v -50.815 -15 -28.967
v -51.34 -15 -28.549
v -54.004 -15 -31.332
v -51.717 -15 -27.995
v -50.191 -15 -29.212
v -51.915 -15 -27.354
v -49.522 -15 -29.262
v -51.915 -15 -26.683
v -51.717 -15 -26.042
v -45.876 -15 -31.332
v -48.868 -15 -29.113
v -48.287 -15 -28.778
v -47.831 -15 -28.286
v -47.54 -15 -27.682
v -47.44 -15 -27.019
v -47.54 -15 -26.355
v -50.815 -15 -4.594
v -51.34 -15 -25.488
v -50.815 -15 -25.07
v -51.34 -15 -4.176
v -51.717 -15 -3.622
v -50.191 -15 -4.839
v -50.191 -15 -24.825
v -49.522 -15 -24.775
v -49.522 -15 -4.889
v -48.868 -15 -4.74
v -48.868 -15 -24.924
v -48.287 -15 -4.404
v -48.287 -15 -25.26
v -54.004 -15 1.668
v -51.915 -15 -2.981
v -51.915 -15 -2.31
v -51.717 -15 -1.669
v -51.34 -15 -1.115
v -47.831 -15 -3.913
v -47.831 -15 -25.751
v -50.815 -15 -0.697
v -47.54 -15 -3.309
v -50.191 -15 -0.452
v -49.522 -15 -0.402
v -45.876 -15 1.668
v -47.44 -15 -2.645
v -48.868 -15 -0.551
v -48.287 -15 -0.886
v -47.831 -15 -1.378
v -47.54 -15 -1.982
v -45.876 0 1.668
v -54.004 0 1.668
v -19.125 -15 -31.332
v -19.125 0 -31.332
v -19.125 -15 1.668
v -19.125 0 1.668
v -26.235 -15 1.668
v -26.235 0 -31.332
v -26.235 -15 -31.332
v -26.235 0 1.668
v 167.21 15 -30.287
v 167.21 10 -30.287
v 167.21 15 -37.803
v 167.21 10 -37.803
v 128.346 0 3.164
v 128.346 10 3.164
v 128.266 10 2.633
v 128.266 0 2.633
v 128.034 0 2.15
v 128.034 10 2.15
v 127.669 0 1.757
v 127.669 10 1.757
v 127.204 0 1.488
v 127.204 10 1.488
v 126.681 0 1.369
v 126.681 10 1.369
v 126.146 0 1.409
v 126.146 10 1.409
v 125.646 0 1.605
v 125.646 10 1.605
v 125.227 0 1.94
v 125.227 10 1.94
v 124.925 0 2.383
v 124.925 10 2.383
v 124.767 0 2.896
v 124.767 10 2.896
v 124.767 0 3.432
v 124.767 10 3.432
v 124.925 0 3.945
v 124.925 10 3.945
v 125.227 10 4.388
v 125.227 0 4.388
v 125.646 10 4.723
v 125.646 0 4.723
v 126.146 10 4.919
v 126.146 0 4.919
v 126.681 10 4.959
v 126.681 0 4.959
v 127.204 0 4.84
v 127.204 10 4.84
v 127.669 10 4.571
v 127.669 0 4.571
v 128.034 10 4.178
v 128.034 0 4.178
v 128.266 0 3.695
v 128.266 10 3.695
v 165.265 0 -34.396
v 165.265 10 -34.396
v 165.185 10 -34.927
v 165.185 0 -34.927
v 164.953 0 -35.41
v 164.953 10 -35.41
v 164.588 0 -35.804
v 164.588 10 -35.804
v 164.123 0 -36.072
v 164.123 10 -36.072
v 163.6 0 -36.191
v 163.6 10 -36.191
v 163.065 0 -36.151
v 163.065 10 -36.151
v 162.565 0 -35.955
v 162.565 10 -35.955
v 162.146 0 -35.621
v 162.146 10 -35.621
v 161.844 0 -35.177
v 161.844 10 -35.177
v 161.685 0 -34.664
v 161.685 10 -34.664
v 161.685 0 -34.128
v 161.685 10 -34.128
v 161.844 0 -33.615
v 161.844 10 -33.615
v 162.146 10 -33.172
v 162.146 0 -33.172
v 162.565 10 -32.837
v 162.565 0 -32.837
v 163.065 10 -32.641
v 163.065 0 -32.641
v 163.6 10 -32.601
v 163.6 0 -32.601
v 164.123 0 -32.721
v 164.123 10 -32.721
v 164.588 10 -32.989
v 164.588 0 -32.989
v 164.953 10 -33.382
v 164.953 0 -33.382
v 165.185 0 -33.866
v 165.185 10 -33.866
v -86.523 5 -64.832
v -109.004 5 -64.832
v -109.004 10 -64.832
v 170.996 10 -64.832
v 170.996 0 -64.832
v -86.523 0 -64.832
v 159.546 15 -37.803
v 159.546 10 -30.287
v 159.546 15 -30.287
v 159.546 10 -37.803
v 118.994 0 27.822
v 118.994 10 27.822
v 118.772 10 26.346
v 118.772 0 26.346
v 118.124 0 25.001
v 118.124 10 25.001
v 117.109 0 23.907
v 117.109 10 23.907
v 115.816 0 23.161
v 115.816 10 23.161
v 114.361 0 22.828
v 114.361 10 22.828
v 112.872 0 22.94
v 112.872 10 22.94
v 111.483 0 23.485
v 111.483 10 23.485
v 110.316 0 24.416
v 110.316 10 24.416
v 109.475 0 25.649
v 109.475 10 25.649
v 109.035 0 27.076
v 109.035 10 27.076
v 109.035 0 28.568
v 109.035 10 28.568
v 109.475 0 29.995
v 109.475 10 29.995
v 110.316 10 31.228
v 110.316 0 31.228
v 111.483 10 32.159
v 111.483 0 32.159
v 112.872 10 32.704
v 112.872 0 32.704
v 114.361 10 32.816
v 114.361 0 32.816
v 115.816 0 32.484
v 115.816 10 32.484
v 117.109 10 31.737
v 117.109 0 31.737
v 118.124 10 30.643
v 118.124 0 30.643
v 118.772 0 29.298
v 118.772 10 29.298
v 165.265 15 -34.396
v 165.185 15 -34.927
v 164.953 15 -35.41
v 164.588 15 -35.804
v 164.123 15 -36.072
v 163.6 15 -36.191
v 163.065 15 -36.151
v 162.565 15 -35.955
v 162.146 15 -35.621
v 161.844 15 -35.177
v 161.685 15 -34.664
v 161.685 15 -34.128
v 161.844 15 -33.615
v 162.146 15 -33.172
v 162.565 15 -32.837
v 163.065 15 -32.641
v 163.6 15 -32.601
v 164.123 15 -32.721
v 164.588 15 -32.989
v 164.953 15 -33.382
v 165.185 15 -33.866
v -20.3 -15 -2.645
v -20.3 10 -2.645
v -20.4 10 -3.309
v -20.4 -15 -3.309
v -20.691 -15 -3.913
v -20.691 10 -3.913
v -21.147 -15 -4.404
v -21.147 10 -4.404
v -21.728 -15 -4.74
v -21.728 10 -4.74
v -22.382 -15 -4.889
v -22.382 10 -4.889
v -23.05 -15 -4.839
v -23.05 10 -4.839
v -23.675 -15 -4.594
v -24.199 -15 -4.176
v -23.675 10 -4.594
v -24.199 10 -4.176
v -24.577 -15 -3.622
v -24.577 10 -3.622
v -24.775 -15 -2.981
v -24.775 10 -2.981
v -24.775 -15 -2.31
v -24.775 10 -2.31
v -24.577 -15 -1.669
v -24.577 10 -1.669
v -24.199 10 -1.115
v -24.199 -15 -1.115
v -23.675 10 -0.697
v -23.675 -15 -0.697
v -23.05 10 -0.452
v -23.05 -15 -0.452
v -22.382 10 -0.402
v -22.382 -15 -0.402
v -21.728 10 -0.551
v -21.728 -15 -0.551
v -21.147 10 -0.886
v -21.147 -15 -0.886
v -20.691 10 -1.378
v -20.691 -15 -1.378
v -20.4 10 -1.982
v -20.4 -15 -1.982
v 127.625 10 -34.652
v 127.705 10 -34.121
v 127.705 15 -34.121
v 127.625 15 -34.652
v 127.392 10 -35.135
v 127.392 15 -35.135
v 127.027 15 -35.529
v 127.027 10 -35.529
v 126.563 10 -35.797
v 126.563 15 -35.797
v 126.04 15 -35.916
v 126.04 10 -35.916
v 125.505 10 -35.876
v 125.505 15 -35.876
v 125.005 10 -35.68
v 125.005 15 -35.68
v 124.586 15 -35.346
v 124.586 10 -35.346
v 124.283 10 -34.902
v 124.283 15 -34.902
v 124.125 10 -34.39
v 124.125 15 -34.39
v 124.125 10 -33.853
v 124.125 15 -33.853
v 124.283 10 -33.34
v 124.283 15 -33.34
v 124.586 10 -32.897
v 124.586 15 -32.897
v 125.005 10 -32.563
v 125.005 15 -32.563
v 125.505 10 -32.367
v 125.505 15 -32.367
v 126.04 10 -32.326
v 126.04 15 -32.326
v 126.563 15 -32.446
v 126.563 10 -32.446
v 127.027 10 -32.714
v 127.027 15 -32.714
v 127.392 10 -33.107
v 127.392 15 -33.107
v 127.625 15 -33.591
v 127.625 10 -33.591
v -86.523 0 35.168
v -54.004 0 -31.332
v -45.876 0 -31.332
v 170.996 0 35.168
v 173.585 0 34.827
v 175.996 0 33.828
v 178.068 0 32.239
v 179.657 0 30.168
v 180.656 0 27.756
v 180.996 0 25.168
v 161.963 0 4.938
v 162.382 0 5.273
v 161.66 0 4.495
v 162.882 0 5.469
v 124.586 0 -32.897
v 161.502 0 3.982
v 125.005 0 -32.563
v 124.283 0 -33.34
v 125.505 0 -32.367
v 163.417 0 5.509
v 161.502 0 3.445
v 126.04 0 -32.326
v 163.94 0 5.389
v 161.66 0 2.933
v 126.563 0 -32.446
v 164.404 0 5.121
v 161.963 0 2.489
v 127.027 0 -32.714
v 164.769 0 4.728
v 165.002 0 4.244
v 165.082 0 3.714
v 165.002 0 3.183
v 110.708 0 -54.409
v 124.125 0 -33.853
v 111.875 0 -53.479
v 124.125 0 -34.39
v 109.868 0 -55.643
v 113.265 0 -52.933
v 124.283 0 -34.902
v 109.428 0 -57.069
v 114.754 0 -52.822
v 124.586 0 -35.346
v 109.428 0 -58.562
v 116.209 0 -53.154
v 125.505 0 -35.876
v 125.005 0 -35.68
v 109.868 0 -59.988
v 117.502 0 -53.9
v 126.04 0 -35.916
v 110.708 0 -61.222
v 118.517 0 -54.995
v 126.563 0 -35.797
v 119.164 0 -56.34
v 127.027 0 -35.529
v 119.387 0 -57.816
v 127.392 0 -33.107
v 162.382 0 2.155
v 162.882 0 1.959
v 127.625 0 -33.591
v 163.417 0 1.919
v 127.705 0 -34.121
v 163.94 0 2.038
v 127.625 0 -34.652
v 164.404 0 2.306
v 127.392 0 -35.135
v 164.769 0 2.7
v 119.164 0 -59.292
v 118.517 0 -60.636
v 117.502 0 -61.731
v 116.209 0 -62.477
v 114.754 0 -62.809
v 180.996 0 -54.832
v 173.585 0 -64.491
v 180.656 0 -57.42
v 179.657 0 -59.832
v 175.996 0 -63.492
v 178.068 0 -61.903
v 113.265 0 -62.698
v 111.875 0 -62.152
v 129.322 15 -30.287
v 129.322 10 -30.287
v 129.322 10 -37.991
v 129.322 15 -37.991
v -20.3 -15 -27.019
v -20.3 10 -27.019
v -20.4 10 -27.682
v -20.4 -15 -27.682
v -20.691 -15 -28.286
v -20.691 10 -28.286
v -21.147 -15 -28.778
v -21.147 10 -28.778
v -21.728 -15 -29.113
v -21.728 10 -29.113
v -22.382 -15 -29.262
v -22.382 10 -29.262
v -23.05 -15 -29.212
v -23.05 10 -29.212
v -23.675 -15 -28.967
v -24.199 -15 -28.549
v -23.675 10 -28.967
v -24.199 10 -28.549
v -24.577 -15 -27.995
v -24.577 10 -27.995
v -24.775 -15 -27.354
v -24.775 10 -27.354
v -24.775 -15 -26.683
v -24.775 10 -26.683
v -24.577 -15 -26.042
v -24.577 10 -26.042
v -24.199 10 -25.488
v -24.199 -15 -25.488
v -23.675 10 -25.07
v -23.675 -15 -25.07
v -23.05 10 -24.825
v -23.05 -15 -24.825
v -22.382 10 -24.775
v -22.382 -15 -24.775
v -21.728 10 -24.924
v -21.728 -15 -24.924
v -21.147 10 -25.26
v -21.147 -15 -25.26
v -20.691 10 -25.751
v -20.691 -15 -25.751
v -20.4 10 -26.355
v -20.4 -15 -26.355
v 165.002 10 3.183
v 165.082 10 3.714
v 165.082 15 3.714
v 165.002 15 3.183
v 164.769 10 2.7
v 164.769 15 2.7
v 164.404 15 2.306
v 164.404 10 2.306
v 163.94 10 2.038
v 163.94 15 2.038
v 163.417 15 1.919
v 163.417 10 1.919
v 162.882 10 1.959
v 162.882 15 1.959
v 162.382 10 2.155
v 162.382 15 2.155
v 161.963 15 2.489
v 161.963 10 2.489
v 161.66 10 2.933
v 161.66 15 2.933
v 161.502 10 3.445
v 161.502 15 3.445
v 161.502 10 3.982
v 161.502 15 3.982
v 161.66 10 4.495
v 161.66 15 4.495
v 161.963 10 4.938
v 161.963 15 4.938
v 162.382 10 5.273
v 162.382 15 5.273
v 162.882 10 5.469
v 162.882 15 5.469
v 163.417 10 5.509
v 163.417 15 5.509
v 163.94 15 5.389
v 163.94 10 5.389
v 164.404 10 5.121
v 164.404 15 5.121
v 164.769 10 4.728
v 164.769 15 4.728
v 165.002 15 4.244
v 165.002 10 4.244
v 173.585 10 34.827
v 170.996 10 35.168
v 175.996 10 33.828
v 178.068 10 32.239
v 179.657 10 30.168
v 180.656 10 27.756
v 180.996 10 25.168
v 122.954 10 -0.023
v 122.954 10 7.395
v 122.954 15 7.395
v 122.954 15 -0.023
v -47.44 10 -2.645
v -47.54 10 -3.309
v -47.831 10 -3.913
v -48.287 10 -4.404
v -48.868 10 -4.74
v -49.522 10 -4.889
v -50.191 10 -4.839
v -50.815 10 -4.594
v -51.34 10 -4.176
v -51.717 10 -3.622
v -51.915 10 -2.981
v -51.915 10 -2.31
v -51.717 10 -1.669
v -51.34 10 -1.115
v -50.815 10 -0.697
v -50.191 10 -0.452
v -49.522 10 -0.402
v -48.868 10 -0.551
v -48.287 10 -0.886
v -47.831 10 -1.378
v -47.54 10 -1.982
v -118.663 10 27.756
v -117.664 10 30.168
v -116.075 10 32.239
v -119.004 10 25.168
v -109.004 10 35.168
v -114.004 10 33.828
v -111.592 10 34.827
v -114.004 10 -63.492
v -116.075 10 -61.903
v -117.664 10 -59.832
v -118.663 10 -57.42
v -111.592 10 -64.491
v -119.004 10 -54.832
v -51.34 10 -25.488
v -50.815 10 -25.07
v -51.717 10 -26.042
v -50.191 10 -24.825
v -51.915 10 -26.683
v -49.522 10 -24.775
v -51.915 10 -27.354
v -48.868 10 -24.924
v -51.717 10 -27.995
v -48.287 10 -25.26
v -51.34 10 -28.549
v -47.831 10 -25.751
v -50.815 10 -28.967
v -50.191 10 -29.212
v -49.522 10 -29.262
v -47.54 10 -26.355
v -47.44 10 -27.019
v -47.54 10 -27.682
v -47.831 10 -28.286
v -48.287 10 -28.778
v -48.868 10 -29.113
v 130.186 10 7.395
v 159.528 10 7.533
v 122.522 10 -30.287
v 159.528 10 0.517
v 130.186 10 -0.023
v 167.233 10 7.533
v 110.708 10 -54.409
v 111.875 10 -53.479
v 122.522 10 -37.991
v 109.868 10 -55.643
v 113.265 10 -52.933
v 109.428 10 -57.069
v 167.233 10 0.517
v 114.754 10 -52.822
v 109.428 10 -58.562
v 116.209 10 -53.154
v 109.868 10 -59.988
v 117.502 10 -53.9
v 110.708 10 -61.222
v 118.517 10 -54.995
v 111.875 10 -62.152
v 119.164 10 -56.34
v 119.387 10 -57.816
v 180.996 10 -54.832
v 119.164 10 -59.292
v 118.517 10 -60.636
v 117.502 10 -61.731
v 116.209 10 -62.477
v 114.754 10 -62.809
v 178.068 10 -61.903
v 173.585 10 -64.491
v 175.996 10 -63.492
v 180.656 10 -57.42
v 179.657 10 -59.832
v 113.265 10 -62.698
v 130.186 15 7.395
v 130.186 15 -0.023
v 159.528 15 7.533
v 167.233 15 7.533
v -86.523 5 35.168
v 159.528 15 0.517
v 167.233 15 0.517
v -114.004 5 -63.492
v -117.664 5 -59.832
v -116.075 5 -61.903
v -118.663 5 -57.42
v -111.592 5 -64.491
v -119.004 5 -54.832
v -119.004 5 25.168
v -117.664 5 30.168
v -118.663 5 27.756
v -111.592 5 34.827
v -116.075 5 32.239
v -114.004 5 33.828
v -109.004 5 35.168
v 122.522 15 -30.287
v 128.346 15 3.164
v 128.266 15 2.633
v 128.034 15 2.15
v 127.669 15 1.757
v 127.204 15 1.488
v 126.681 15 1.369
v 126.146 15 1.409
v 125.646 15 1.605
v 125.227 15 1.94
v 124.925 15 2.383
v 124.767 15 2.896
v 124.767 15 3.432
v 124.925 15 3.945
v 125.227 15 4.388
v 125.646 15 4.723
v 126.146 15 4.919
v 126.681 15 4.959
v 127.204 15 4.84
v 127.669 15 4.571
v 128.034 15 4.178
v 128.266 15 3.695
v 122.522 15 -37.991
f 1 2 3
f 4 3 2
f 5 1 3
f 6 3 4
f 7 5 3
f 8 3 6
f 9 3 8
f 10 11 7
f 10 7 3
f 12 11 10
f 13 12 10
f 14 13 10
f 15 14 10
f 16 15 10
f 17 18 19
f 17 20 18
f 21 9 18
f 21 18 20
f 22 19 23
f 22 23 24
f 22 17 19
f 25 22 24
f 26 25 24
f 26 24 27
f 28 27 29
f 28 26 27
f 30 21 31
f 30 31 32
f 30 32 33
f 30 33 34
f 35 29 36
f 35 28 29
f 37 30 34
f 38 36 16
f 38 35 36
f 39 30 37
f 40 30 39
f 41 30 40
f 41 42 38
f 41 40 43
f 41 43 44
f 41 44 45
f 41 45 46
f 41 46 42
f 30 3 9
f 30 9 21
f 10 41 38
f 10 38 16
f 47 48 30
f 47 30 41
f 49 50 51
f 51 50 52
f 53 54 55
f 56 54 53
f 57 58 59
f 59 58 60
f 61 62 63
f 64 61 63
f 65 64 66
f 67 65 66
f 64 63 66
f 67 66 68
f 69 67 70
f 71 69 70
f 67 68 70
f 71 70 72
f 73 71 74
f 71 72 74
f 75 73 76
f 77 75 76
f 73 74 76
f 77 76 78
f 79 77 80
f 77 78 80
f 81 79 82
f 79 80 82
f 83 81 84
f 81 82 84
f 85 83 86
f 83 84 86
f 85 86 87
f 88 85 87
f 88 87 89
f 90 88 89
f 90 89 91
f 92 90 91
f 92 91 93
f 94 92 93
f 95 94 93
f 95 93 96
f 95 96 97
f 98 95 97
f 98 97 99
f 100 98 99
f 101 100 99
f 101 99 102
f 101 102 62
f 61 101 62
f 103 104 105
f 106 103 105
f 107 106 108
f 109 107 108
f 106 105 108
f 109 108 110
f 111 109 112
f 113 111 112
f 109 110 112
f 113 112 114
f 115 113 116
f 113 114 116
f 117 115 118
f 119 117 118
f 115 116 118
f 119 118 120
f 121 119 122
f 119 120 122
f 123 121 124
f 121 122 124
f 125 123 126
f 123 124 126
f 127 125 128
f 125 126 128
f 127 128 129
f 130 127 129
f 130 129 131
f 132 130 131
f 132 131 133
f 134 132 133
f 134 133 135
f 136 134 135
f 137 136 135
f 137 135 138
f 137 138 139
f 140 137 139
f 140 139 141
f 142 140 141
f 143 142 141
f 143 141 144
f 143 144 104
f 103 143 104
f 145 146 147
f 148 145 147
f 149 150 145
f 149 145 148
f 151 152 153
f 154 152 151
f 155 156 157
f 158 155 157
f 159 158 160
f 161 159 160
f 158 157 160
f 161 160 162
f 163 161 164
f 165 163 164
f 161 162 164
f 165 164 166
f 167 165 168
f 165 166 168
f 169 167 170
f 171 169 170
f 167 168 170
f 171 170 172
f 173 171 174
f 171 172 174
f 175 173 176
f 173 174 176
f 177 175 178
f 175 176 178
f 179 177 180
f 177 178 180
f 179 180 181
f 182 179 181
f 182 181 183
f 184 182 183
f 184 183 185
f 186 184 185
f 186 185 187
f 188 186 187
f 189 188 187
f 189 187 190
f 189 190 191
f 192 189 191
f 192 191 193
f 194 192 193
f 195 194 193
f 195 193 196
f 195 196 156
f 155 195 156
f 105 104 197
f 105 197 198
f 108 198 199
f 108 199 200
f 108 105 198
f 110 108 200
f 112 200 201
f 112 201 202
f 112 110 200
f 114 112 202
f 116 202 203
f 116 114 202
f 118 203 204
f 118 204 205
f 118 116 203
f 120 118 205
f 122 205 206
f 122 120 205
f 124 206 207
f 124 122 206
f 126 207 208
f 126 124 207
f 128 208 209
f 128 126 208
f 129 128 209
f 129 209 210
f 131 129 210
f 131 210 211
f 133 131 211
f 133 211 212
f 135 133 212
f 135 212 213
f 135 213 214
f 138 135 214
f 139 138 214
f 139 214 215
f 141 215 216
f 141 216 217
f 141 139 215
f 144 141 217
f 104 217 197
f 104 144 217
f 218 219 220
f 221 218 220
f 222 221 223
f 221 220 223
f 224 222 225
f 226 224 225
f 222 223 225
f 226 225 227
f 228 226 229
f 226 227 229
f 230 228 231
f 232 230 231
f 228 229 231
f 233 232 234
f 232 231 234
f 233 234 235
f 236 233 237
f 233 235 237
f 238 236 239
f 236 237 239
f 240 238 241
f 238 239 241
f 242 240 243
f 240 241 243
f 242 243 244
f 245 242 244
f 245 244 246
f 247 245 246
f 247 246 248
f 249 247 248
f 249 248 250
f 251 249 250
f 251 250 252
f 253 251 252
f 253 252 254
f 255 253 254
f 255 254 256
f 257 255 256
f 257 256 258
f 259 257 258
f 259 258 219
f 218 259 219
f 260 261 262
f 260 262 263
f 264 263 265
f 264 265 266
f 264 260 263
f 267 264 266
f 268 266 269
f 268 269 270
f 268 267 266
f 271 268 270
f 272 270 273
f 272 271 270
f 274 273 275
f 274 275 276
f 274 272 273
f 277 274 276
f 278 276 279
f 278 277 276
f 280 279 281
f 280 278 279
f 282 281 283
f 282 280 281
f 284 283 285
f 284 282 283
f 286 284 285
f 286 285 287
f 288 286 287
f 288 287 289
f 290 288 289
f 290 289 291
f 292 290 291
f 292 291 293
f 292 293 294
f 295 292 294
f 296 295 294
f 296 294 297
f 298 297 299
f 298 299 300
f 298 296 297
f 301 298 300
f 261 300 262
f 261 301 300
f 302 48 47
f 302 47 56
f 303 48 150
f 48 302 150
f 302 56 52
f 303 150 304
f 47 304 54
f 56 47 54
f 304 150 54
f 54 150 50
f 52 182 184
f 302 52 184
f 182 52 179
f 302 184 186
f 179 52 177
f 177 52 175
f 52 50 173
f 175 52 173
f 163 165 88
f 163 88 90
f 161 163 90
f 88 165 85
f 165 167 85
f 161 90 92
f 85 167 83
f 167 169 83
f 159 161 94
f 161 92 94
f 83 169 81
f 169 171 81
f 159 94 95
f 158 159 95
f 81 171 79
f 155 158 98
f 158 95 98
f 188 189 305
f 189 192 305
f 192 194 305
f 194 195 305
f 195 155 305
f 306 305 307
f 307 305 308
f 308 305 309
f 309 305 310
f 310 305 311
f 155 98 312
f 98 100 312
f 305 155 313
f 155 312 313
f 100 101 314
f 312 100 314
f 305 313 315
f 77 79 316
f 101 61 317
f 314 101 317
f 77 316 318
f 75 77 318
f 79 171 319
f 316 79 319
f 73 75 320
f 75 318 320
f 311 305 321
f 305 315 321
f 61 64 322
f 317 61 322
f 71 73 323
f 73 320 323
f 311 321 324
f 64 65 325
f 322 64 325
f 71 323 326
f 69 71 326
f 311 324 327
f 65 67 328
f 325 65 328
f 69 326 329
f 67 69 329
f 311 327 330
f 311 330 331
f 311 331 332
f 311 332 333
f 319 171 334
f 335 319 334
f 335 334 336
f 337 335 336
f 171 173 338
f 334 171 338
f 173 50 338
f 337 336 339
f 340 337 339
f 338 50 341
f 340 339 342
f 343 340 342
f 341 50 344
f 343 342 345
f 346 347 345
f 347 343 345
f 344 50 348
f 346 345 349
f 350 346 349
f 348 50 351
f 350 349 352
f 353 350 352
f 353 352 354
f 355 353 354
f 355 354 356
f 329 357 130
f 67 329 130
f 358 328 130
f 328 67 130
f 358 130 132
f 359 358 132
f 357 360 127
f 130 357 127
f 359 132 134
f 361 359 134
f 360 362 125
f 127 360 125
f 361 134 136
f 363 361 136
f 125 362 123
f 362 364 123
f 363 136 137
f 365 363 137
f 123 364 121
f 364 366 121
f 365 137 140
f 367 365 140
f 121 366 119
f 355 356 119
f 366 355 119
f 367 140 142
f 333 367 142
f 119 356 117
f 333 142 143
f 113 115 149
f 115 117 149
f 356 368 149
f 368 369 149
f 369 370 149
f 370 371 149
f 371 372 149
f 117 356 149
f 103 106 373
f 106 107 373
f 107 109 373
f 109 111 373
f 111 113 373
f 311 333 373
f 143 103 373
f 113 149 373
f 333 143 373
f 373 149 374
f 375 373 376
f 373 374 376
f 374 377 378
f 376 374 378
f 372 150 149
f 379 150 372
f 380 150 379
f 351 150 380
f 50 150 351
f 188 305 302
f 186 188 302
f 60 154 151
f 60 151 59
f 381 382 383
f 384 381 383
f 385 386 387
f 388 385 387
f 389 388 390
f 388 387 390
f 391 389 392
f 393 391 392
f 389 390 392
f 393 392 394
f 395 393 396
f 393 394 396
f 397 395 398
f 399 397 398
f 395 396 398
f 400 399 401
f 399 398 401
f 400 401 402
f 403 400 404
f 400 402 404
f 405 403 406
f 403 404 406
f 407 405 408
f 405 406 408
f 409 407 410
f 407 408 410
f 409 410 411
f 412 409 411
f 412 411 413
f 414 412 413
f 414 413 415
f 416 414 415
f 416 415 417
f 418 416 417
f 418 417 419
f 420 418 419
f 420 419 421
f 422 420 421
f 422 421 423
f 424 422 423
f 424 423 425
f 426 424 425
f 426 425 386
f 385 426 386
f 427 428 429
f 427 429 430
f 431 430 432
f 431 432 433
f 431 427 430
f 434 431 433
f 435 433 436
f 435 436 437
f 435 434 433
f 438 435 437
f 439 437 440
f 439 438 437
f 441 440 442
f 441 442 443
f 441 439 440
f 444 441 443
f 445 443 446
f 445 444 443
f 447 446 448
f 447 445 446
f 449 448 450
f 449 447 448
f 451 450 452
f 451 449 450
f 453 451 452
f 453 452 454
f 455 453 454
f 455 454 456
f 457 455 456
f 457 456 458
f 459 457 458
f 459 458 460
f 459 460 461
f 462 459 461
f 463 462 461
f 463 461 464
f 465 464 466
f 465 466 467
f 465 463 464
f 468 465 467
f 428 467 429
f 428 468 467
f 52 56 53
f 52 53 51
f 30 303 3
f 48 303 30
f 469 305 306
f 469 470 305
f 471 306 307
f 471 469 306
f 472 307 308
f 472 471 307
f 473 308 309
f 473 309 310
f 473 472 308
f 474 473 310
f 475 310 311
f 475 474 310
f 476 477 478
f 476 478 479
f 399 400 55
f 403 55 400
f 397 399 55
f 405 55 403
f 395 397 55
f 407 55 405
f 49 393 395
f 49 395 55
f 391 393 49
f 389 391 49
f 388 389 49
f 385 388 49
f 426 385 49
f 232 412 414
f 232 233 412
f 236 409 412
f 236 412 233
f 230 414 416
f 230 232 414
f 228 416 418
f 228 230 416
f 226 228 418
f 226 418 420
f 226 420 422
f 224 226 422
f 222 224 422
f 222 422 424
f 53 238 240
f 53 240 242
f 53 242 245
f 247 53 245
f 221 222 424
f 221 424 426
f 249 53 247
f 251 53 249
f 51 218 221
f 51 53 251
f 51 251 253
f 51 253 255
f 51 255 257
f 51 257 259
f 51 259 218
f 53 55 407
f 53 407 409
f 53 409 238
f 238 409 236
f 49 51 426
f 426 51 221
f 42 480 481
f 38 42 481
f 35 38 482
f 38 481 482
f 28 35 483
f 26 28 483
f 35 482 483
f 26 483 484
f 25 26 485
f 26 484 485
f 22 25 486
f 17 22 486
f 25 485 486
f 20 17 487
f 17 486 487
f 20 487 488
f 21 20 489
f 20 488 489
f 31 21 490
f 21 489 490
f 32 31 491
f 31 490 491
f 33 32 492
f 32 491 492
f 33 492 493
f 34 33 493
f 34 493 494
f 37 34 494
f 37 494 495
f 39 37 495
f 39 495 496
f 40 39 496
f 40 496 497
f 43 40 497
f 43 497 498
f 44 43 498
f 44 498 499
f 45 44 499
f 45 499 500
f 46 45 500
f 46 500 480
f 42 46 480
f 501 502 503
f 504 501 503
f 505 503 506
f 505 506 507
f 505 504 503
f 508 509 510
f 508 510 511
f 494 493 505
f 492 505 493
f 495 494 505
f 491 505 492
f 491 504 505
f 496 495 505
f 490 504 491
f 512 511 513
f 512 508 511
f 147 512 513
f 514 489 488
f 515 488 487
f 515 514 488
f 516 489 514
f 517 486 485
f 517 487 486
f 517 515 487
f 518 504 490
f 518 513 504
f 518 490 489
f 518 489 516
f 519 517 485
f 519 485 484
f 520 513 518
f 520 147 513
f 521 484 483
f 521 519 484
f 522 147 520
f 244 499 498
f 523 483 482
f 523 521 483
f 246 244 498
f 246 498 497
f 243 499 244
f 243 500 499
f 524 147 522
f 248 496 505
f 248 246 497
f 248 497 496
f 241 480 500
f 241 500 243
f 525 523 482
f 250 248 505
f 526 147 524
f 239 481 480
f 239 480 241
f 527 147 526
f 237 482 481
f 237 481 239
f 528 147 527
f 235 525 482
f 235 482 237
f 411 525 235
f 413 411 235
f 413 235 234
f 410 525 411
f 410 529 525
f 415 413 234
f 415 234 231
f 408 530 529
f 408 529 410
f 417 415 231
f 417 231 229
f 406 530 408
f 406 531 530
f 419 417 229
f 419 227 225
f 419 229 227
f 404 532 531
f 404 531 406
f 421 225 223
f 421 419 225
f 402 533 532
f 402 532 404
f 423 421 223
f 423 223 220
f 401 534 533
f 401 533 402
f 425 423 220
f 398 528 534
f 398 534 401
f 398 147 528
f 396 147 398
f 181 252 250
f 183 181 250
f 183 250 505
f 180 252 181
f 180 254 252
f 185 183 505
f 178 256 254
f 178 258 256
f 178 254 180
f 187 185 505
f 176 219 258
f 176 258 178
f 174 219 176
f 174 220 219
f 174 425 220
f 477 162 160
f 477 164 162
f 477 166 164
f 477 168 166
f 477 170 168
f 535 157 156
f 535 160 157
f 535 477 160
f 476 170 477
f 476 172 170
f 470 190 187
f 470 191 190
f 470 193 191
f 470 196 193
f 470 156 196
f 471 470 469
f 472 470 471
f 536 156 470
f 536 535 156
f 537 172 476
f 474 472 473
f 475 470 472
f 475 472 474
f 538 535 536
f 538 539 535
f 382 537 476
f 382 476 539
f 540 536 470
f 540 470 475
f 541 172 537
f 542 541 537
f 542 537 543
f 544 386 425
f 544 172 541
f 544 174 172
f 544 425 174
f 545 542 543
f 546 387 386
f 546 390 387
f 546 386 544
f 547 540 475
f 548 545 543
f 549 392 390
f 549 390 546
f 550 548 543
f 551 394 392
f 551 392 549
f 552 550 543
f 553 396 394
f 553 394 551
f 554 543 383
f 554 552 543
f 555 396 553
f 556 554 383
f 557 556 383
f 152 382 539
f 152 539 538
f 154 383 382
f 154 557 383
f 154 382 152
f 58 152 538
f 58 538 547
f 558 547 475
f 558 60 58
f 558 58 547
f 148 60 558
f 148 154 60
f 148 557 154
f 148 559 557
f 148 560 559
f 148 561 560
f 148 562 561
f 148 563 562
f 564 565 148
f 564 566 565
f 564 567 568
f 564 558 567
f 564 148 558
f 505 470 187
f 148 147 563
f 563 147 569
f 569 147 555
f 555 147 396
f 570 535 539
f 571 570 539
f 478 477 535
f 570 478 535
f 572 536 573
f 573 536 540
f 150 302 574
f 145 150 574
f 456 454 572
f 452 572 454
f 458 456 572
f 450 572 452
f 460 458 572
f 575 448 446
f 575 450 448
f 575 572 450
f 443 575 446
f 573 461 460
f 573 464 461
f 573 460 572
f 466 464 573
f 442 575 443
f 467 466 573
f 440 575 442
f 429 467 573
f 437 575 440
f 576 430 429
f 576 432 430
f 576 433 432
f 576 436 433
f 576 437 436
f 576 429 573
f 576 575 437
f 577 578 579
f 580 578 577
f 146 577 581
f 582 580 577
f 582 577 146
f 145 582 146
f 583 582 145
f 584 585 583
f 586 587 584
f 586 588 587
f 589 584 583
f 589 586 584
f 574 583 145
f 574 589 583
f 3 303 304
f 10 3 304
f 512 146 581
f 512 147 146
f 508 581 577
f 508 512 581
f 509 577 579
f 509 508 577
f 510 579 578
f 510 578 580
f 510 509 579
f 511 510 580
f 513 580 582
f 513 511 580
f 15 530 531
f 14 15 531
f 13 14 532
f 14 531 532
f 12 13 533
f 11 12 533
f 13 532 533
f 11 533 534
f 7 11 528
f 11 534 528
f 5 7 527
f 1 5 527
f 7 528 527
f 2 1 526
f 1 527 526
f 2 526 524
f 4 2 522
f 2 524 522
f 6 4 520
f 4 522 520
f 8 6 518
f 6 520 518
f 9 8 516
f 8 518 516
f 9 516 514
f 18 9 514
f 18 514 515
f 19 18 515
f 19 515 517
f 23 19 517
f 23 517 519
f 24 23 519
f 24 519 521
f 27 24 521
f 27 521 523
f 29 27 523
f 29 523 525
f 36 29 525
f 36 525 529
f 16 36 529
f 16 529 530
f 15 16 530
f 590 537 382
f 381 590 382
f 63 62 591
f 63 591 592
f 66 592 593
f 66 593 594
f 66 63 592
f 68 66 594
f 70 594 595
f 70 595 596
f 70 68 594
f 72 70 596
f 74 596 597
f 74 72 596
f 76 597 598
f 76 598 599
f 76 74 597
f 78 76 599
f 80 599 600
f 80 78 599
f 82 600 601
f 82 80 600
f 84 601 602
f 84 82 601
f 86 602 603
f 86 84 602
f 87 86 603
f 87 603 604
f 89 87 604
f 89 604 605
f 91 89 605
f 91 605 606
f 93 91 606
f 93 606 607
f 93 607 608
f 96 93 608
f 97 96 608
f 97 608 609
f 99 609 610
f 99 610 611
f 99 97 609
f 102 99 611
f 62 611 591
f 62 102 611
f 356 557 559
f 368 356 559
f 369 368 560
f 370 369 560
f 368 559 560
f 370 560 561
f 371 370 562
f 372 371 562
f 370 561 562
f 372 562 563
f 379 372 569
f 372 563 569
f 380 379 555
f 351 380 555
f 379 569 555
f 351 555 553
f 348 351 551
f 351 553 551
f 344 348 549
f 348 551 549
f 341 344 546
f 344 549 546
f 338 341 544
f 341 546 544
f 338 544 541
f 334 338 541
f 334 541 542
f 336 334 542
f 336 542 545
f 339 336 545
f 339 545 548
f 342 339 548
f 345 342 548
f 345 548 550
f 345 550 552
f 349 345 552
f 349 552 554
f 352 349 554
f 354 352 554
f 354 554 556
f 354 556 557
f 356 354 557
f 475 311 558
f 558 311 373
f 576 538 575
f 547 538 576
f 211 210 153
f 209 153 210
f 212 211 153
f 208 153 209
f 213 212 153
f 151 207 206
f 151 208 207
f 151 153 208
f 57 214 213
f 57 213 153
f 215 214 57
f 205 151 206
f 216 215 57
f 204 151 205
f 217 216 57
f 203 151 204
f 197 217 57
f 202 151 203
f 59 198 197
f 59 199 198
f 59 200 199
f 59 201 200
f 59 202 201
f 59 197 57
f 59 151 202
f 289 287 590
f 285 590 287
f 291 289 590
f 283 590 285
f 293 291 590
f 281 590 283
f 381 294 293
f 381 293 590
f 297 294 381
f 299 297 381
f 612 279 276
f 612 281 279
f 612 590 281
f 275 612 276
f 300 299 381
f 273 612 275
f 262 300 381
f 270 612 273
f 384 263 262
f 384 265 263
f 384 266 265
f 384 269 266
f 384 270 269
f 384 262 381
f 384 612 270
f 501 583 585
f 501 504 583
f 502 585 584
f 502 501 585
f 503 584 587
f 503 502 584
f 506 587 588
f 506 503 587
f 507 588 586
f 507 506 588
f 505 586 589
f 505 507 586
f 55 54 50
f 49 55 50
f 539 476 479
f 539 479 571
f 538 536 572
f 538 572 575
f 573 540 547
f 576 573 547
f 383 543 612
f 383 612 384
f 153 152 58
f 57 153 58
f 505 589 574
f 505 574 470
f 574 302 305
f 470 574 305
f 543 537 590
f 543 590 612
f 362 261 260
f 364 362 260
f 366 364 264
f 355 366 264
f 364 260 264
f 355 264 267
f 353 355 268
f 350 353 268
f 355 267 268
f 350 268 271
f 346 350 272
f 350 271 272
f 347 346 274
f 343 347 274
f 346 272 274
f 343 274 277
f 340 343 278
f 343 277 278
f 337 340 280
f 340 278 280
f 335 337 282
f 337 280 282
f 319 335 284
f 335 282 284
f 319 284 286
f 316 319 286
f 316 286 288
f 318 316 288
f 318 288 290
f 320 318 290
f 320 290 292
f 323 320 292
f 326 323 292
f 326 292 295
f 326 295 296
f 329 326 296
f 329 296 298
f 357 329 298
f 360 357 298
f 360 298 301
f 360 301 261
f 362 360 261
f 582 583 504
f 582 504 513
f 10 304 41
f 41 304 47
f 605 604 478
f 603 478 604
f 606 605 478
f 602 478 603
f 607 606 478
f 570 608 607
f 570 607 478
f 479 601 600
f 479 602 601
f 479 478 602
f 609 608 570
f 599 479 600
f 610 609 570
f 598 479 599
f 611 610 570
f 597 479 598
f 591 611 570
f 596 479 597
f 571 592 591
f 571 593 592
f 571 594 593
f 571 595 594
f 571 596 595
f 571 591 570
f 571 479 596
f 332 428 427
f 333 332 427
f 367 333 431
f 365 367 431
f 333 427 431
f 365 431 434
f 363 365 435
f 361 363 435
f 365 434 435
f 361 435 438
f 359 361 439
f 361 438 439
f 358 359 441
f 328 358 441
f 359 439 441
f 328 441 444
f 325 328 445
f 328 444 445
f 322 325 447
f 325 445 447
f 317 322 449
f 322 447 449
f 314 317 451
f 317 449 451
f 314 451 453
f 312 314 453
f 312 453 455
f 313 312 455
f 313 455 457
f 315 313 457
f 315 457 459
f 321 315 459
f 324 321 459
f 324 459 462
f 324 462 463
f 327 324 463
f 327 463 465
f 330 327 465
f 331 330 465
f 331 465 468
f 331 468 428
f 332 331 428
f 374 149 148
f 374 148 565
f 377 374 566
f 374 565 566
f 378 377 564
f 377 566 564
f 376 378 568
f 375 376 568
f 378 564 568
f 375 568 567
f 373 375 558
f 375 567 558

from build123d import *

# Parameters (mm, degrees)
SKETCH2_W               = 300
SKETCH2_H               = 100
BOSS_EXTRUDE1_DEPTH     = 10
SKETCH3_W               = 32.480865485
SKETCH3_H               = 5
CUT_EXTRUDE4_DEPTH      = 100
FILLET2_R               = 10
FILLET3_R               = 10
SKETCH6_R               = 1.8
CUT_EXTRUDE11_DEPTH     = 100
SKETCH10_W              = 6.800425214
SKETCH10_H              = 7.704447869
SKETCH10_R              = 1.8
SKETCH10_W_2            = 7.232198243
SKETCH10_H_2            = 7.417822841
SKETCH10_W_3            = 7.704447868
SKETCH10_H_3            = 7.016311729
SKETCH10_W_4            = 7.663971273
SKETCH10_H_4            = 7.516208799
BOSS_EXTRUDE3_DEPTH     = 5
SKETCH11_R              = 5.007661082
CUT_EXTRUDE13_DEPTH     = 30
CROQUIS2_W              = 7.110286561
CROQUIS2_H              = 33
CROQUIS2_W_2            = 8.127928254
SALIENTE_EXTRUIR1_DEPTH = 15
SKETCH8_R               = 2.25
CORTAR_EXTRUIR1_DEPTH   = 50


with BuildPart() as part:
    # Sketch2 → Boss-Extrude1 (new body)
    with BuildSketch(Plane(origin=(0, 0, 0), x_dir=(1, 0, 0), z_dir=(0, 1, 0))):
        with Locations((30.996437266, 14.831990454)):
            Rectangle(SKETCH2_W, SKETCH2_H)
    extrude(amount=BOSS_EXTRUDE1_DEPTH)

    # Sketch3 → Cut-Extrude4 (cut)
    with BuildSketch(Plane.XY.offset(35.168009546)):
        with Locations((-102.763129992, 2.5)):
            Rectangle(SKETCH3_W, SKETCH3_H)
    extrude(amount=-CUT_EXTRUDE4_DEPTH, mode=Mode.SUBTRACT)

    # Fillet2
    fillet2_edges = [part.edges().sort_by_distance(p)[0] for p in [
        (180.996437266, 5, -64.831990454),
        (180.996437266, 5, 35.168009546),
    ]]
    fillet(fillet2_edges, radius=FILLET2_R)

    # Fillet3
    fillet3_edges = [part.edges().sort_by_distance(p)[0] for p in [
        (-119.003562734, 7.5, -64.831990454),
        (-119.003562734, 7.5, 35.168009546),
    ]]
    fillet(fillet3_edges, radius=FILLET3_R)

    # Sketch6 → Cut-Extrude11 (cut)
    with BuildSketch(Plane(origin=(0, 10, 0), x_dir=(1, 0, 0), z_dir=(0, 1, 0))):
        with Locations((125.905144225, 34.121382773)):
            Circle(SKETCH6_R)
        with Locations((126.546416062, -3.163994016)):
            Circle(SKETCH6_R)
        with Locations((163.282131276, -3.71365559)):
            Circle(SKETCH6_R)
        with Locations((163.465351801, 34.39621356)):
            Circle(SKETCH6_R)
    extrude(amount=-CUT_EXTRUDE11_DEPTH, mode=Mode.SUBTRACT)

    # Sketch10 → Boss-Extrude3 (add)
    with BuildSketch(Plane(origin=(0, 10, 0), x_dir=(1, 0, 0), z_dir=(0, 1, 0))):
        with Locations((125.922054042, 34.139208999)):
            Rectangle(SKETCH10_W, SKETCH10_H)
        with Locations((125.905144225, 34.121382773)):
            Circle(SKETCH10_R, mode=Mode.SUBTRACT)
        with Locations((126.569713587, -3.685857636)):
            Rectangle(SKETCH10_W_2, SKETCH10_H_2)
        with Locations((126.546416062, -3.163994016)):
            Circle(SKETCH10_R, mode=Mode.SUBTRACT)
        with Locations((163.380664231, -4.024818367)):
            Rectangle(SKETCH10_W_3, SKETCH10_H_3)
        with Locations((163.282131276, -3.71365559)):
            Circle(SKETCH10_R, mode=Mode.SUBTRACT)
        with Locations((163.378364349, 34.045089464)):
            Rectangle(SKETCH10_W_4, SKETCH10_H_4)
        with Locations((163.465351801, 34.39621356)):
            Circle(SKETCH10_R, mode=Mode.SUBTRACT)
    extrude(amount=BOSS_EXTRUDE3_DEPTH)

    # Sketch11 → Cut-Extrude13 (cut)
    with BuildSketch(Plane(origin=(0, 10, 0), x_dir=(1, 0, 0), z_dir=(0, 1, 0))):
        with Locations((114.379298218, 57.815546059)):
            Circle(SKETCH11_R)
        with Locations((113.986464963, -27.822103537)):
            Circle(SKETCH11_R)
    extrude(amount=-CUT_EXTRUDE13_DEPTH, mode=Mode.SUBTRACT)

    # Croquis2 → Saliente-Extruir1 (add)
    with BuildSketch(Plane.XZ):
        with Locations((-22.680335873, -14.831990454)):
            Rectangle(CROQUIS2_W, CROQUIS2_H)
        with Locations((-49.939598607, -14.831990454)):
            Rectangle(CROQUIS2_W_2, CROQUIS2_H)
    extrude(amount=SALIENTE_EXTRUIR1_DEPTH)

    # Sketch8 → Cortar-Extruir1 (cut)
    with BuildSketch(Plane(origin=(0, 10, 0), x_dir=(1, 0, 0), z_dir=(0, 1, 0))):
        with Locations((-49.690211369, 27.018639088)):
            Circle(SKETCH8_R)
        with Locations((-49.690211369, 2.645341819)):
            Circle(SKETCH8_R)
        with Locations((-22.549681442, 27.018639088)):
            Circle(SKETCH8_R)
        with Locations((-22.549681442, 2.645341819)):
            Circle(SKETCH8_R)
    extrude(amount=-CORTAR_EXTRUIR1_DEPTH, mode=Mode.SUBTRACT)


solid = part.part
